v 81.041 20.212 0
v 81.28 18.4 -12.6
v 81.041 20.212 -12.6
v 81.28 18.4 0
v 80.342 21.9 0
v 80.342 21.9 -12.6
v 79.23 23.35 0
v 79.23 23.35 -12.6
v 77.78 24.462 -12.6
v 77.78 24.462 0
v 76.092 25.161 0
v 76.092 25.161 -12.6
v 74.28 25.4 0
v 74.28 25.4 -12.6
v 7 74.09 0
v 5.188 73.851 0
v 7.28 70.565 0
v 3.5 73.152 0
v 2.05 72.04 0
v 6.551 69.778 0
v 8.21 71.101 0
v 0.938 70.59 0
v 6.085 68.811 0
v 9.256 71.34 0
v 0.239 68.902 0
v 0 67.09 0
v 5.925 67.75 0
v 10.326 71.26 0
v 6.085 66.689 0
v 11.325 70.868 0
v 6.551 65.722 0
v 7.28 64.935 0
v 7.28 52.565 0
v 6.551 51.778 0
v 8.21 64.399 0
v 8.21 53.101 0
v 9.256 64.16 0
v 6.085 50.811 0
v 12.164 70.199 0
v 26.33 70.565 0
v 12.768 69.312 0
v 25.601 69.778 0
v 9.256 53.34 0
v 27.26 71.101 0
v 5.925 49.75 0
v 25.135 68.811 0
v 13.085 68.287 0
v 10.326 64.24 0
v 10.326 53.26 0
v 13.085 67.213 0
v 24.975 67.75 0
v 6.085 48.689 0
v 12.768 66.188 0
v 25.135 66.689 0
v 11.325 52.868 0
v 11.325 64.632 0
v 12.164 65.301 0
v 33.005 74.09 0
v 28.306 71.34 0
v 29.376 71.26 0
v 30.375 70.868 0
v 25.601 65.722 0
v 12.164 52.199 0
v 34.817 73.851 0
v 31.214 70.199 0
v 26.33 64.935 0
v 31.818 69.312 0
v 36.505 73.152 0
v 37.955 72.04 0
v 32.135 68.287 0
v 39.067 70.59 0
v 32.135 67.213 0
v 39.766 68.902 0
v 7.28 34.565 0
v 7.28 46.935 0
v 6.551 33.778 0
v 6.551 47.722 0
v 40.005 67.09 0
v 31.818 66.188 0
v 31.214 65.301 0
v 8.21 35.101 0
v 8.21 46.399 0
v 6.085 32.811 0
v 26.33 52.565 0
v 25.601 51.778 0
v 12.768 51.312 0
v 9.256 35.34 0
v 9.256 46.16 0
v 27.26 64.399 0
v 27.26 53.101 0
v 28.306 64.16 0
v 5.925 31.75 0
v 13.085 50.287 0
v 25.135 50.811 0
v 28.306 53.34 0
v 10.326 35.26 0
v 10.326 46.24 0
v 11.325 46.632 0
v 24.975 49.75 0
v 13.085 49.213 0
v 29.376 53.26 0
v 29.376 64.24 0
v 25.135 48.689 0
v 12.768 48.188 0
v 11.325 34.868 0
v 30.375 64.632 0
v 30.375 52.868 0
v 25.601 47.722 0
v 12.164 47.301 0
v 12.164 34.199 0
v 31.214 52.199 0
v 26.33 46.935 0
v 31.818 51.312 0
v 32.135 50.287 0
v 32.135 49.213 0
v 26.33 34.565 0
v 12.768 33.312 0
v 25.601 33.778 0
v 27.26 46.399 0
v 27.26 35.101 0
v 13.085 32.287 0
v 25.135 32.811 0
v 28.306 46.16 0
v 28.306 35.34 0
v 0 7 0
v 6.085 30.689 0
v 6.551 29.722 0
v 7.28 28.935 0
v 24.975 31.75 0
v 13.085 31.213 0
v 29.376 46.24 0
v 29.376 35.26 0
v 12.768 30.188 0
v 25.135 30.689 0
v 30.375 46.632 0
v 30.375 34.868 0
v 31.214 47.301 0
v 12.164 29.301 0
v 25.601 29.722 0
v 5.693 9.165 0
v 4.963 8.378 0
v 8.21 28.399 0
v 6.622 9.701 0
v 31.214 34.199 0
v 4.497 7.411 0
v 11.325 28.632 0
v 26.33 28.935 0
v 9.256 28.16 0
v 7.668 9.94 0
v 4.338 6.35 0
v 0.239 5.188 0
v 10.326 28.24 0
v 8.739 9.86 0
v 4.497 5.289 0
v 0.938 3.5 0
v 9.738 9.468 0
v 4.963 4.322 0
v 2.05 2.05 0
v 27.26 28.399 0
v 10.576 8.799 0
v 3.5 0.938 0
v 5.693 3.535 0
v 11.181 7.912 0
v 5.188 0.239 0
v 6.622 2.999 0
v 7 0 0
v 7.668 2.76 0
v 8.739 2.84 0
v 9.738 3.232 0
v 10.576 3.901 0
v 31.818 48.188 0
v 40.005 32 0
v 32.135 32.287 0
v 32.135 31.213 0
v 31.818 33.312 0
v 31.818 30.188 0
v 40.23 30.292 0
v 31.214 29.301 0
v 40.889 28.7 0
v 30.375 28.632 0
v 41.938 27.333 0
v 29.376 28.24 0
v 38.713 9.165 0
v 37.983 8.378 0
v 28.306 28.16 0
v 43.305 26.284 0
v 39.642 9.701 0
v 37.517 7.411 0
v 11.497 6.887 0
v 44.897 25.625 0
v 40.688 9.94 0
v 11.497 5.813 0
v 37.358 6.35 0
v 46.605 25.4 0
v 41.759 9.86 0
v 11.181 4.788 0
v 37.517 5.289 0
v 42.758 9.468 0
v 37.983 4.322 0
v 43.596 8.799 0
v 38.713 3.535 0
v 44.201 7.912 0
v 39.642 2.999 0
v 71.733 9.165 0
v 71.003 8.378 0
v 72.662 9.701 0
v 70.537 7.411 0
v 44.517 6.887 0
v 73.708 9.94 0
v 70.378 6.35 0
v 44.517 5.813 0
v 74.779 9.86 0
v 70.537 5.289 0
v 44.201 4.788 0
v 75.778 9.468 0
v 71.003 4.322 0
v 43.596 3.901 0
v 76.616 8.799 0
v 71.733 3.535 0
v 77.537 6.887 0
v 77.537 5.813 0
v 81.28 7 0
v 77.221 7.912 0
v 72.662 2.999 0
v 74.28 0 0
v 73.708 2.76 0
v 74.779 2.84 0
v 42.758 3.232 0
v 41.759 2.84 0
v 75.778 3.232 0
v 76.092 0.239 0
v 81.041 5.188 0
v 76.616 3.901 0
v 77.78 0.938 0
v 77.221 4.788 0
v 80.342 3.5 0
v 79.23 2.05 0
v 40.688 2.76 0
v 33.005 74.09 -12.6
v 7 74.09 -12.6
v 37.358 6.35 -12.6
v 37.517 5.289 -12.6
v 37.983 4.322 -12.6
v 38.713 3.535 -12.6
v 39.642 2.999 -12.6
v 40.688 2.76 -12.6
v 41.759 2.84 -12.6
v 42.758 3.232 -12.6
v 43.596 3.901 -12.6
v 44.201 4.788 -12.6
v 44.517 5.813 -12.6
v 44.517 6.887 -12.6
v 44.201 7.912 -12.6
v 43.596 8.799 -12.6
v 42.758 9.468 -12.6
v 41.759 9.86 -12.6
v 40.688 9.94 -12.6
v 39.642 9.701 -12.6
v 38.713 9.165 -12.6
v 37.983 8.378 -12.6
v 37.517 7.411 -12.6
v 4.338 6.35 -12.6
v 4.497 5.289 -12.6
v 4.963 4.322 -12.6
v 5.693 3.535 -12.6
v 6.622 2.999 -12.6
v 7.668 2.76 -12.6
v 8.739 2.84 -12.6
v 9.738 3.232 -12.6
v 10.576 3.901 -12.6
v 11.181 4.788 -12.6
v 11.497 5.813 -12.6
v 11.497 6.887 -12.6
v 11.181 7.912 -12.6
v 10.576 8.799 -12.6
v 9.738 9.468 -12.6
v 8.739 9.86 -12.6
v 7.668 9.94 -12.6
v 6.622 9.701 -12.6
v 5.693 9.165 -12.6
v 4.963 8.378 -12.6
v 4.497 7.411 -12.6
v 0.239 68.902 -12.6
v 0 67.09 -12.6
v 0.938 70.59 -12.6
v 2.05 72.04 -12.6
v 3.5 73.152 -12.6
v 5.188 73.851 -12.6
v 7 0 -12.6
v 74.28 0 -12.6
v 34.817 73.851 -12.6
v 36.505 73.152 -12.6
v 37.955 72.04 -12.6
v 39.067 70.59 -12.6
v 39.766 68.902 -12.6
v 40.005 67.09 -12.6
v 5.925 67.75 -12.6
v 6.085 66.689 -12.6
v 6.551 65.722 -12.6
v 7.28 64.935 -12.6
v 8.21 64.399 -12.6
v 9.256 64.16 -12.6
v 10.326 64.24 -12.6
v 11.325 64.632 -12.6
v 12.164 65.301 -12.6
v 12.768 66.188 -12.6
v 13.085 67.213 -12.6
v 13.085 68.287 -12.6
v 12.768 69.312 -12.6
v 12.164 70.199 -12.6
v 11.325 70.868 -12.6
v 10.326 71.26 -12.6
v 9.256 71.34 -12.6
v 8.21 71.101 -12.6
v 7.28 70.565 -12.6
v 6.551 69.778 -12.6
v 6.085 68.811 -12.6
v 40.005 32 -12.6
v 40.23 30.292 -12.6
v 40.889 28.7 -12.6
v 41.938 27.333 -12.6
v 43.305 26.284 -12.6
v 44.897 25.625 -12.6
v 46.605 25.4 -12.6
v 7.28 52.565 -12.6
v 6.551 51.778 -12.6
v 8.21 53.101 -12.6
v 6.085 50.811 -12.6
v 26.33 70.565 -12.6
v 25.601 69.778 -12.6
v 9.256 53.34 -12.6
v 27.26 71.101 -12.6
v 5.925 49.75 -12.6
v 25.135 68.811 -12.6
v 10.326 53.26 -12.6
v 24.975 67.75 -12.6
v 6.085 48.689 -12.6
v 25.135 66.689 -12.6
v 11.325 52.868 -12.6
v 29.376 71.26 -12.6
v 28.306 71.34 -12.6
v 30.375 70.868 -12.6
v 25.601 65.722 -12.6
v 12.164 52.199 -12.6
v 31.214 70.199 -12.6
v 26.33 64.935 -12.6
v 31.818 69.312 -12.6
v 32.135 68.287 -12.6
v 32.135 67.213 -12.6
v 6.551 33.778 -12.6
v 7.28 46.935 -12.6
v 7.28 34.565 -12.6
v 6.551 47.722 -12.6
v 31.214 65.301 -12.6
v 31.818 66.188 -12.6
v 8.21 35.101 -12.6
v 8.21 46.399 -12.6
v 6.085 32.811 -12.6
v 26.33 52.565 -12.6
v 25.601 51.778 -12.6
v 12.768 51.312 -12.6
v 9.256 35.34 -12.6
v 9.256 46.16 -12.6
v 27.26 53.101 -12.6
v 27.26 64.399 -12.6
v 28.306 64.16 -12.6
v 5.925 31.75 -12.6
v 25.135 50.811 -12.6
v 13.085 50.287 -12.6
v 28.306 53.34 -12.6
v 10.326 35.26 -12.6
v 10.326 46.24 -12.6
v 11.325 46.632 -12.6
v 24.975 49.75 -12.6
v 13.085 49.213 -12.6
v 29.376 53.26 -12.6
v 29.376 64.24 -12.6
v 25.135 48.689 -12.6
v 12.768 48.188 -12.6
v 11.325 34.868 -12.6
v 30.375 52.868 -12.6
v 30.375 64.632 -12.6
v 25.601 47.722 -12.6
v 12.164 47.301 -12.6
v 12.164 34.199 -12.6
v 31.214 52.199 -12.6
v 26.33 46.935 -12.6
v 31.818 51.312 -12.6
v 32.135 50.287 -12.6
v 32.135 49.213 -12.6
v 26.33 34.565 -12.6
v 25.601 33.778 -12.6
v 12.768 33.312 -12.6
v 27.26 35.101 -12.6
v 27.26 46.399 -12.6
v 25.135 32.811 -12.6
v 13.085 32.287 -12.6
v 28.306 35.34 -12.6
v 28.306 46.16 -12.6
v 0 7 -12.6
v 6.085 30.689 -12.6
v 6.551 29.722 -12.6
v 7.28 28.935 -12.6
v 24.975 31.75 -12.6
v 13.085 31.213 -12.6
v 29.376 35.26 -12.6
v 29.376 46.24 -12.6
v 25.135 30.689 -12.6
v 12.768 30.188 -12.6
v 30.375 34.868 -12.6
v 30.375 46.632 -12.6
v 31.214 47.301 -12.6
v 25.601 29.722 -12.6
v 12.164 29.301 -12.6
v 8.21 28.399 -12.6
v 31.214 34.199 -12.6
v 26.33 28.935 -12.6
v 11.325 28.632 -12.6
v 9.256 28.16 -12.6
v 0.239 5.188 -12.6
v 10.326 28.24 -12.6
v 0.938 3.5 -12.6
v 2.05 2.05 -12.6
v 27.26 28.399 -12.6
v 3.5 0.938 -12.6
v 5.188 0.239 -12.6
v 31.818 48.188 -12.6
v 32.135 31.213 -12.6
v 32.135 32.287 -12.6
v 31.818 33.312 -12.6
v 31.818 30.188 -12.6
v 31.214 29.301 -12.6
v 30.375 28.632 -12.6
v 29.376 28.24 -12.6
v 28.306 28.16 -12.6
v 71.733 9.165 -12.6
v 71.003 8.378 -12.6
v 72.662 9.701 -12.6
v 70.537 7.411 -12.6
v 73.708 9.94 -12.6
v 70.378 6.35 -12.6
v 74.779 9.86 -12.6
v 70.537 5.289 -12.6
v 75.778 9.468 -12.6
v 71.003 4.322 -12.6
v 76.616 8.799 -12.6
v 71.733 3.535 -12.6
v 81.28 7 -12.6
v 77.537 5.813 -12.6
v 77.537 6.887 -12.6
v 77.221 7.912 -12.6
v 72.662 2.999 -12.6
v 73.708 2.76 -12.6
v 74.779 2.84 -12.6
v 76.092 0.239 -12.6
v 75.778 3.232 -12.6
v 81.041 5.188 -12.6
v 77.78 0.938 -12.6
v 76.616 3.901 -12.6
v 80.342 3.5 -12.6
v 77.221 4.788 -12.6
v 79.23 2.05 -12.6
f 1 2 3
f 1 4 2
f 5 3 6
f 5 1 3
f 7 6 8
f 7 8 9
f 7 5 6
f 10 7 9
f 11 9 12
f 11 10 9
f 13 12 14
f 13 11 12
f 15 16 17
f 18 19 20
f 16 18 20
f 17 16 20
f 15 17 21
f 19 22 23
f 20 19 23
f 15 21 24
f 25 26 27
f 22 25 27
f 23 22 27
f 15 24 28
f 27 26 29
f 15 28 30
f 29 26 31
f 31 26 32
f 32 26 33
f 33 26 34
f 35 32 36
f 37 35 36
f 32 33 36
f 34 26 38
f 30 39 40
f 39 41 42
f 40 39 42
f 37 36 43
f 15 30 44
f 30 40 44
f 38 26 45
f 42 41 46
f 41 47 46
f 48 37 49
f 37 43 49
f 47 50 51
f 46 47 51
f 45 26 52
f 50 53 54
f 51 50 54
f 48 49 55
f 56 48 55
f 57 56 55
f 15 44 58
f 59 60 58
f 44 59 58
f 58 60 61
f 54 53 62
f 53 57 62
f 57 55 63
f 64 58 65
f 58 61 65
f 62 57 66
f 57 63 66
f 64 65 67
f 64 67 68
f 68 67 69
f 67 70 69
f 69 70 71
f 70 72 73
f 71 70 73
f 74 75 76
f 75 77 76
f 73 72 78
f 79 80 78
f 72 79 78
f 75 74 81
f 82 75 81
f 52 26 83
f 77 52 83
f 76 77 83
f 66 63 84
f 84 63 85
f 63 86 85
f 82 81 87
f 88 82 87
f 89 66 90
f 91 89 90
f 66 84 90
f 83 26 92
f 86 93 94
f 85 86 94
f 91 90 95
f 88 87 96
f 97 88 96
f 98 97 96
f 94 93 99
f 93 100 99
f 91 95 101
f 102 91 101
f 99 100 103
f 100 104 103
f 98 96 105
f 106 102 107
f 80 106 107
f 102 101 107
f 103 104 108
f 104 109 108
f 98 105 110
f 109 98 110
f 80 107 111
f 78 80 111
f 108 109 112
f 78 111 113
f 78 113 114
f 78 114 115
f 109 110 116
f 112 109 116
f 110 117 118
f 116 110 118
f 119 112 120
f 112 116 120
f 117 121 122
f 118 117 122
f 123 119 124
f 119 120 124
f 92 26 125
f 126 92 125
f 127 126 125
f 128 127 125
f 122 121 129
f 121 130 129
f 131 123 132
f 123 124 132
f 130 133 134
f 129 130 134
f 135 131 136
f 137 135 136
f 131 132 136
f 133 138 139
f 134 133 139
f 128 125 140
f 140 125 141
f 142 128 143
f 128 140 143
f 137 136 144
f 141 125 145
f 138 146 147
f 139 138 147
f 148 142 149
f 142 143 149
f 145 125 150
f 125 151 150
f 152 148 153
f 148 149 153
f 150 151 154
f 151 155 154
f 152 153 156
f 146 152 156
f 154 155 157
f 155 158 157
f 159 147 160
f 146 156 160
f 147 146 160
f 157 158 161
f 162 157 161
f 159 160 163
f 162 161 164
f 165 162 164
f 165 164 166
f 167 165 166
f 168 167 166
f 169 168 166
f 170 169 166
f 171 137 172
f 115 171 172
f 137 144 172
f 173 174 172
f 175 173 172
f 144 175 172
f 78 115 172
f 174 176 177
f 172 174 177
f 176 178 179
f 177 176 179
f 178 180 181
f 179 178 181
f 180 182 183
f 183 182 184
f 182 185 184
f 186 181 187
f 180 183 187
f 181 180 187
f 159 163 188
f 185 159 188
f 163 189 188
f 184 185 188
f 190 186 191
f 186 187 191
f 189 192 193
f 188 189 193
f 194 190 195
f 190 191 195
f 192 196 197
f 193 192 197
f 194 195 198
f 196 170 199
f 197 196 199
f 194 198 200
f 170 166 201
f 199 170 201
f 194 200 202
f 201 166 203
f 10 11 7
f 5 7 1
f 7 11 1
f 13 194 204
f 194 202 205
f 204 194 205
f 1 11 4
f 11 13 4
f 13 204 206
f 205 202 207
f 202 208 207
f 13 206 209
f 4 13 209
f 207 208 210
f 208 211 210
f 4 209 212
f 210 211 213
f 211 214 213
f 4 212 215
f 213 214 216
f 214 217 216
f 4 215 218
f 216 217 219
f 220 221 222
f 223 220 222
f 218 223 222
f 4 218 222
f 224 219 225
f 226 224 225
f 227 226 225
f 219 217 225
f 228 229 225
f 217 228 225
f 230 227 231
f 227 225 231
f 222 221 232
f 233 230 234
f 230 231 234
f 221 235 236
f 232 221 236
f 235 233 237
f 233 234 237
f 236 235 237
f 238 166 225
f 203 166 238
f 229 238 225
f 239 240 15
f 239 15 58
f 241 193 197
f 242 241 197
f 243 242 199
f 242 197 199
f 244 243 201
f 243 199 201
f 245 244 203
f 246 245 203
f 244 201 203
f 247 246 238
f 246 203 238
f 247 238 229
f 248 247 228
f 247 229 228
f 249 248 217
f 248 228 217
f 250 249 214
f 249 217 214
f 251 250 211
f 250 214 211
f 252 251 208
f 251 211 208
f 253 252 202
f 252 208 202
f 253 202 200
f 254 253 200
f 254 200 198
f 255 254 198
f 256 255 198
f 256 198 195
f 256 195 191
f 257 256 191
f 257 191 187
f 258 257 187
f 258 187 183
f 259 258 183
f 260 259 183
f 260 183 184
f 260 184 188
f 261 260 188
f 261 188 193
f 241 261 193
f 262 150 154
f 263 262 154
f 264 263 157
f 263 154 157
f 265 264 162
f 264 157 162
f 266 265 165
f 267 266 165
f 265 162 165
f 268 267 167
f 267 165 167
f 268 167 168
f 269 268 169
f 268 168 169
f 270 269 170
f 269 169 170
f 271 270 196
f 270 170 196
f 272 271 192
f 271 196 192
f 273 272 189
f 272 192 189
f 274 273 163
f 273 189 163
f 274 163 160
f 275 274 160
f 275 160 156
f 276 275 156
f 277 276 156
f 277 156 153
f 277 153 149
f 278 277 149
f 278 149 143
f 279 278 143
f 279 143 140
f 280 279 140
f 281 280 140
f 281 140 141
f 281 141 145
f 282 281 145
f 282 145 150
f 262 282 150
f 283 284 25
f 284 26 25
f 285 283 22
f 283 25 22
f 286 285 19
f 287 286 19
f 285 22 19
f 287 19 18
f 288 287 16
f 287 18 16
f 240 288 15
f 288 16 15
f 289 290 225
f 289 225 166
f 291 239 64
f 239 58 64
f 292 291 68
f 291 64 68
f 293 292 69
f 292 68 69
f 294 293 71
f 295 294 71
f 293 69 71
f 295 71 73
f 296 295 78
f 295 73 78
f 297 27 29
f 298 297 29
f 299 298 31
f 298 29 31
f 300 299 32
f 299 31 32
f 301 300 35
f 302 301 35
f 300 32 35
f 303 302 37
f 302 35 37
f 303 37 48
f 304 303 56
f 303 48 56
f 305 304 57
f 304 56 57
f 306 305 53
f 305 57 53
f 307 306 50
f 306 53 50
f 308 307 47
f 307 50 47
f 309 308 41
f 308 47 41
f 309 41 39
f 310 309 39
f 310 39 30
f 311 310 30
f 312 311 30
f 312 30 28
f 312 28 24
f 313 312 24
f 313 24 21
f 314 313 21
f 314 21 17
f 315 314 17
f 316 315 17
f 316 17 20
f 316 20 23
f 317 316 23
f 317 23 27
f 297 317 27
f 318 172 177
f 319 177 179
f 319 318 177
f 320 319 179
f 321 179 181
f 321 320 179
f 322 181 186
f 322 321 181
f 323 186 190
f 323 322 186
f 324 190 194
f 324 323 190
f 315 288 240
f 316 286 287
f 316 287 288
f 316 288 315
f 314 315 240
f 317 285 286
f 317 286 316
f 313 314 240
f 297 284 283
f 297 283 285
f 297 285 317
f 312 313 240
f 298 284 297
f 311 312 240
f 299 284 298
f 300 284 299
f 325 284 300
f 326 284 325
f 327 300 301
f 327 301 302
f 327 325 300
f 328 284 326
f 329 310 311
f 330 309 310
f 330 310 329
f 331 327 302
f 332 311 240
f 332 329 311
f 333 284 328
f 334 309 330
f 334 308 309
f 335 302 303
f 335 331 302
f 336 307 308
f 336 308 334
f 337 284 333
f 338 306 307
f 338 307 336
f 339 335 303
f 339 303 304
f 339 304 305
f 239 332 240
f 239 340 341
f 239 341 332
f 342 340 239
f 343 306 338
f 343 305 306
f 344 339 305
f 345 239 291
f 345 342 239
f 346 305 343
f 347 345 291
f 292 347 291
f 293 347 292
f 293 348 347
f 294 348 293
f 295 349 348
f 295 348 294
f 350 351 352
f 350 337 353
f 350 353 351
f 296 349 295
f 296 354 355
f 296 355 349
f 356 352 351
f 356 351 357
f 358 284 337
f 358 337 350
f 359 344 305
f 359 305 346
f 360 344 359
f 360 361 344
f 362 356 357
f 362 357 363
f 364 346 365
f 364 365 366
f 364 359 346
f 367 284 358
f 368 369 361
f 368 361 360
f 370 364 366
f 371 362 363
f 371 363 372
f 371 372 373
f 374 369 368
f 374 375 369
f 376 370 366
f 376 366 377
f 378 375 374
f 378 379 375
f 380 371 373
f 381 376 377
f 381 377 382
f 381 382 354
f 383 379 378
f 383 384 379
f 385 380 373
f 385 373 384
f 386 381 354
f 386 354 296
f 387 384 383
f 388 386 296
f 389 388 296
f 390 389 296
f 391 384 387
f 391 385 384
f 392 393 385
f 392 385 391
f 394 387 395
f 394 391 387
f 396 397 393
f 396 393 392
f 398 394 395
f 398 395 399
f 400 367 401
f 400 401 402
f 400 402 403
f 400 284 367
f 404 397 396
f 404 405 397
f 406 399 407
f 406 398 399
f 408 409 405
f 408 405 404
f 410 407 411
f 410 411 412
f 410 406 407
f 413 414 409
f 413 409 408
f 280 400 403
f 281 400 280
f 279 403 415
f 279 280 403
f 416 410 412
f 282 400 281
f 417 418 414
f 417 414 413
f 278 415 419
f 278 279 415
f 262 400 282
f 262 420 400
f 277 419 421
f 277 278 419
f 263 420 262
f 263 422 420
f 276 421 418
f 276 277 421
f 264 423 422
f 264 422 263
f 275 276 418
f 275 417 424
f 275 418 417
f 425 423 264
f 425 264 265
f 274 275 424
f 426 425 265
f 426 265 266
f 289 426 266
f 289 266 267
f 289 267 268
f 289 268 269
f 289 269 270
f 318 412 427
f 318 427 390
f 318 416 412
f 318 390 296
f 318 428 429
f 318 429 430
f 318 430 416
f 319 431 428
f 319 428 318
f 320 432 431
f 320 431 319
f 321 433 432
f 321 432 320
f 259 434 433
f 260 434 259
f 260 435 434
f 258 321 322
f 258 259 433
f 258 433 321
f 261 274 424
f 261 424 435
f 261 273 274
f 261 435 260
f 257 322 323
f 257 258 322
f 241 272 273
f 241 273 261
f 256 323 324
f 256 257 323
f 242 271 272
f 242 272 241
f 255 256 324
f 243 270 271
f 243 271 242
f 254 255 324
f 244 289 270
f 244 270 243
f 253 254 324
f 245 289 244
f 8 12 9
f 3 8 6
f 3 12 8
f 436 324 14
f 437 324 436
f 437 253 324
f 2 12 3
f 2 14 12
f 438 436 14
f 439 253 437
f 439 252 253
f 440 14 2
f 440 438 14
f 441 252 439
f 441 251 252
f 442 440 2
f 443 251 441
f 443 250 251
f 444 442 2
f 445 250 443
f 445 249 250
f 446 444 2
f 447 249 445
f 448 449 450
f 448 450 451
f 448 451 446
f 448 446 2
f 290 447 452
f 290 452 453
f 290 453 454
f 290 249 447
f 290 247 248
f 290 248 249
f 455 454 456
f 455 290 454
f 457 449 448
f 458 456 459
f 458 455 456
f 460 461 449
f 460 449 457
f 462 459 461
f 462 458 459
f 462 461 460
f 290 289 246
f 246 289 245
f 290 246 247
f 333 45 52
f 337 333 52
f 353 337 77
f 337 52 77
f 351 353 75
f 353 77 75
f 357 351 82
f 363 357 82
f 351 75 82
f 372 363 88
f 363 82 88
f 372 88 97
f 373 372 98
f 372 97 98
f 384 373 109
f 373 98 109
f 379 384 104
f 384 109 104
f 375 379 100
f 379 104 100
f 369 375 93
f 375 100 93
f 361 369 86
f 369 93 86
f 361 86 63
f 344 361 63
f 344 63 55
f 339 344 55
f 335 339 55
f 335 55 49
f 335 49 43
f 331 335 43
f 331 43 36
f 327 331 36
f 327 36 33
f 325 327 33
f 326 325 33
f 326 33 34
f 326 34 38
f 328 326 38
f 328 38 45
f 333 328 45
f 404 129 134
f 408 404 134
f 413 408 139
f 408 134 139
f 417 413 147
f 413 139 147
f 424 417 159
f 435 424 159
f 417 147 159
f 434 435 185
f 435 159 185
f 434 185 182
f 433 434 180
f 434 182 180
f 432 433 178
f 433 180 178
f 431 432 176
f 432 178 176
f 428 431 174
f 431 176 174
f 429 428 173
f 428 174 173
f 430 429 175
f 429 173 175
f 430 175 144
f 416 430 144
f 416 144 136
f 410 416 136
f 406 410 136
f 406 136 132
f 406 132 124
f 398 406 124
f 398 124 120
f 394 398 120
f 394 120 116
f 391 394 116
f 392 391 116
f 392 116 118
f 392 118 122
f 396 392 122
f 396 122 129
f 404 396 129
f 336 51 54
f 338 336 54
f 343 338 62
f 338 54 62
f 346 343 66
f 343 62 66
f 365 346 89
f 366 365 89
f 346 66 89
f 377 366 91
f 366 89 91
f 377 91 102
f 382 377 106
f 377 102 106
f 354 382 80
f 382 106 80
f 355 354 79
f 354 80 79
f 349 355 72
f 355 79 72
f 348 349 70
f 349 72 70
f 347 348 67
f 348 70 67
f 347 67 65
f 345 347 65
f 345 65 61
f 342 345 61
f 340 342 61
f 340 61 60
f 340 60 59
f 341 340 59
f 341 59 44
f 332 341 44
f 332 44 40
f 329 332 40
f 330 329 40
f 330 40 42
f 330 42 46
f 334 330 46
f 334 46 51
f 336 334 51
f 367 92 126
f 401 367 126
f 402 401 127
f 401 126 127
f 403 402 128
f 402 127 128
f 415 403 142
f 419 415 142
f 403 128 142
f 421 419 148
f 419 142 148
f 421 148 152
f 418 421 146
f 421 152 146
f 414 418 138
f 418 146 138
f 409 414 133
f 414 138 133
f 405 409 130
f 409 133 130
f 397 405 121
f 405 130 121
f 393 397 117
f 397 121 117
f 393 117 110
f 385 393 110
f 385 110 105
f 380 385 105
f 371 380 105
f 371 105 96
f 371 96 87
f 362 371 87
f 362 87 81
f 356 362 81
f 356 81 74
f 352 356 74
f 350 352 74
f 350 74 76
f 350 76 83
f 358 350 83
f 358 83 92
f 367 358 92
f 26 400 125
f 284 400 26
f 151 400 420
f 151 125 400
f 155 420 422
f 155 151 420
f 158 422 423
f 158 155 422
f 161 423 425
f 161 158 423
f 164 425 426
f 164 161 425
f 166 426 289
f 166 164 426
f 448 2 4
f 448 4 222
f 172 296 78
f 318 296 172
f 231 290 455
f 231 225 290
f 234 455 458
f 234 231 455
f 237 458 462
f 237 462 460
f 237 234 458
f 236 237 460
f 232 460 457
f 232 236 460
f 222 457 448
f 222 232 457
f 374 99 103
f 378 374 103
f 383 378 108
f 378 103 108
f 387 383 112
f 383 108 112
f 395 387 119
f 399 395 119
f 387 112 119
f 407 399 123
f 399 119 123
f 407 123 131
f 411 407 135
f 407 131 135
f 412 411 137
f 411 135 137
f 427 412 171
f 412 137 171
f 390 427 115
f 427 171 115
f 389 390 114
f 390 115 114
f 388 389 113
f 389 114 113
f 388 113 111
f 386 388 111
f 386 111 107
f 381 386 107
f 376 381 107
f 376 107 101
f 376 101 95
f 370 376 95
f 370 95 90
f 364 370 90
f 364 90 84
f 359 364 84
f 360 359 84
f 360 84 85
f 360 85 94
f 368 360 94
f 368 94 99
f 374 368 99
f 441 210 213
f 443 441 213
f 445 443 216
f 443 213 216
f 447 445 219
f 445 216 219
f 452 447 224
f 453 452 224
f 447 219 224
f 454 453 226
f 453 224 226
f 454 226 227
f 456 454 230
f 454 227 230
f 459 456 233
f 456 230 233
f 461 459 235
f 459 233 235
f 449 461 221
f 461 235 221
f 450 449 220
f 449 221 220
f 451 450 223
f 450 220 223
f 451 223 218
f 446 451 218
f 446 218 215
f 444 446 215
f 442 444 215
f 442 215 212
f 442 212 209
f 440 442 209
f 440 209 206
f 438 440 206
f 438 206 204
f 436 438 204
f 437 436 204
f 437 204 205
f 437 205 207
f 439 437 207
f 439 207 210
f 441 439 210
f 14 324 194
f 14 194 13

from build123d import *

# Parameters (mm, degrees)
PAD_DEPTH             = 12.6
SKETCH001_R           = 3.6
POCKET_DEPTH          = 12.601
FILLET_R              = 7
CLONE_PLACEMENT_ANGLE = 180


with BuildPart() as part:
    # Sketch → Pad (new body)
    with BuildSketch(Plane.XY):
        with BuildLine():
            Line((0, 0), (0, -74.09))
            Line((0, -74.09), (-40.005, -74.09))
            Line((-40.005, -74.09), (-40.005, -32))
            ThreePointArc((-40.005, -32), (-41.938095, -27.333095), (-46.605, -25.4))
            Line((-46.605, -25.4), (-81.28, -25.4))
            Line((-81.28, -25.4), (-81.28, 0))
            Line((-81.28, 0), (0, 0))
        make_face()
    extrude(amount=PAD_DEPTH)

    # Sketch001 (on Face9 of Pad) → Pocket (cut, through all)
    with BuildSketch(Plane.XY.offset(12.6)):
        with Locations((-73.9775, -6.35)):
            Circle(SKETCH001_R)
        with Locations((-7.9375, -6.35)):
            Circle(SKETCH001_R)
        with Locations((-40.9575, -6.35)):
            Circle(SKETCH001_R)
        with Locations((-28.575, -31.75)):
            Circle(SKETCH001_R)
        with Locations((-9.525, -31.75)):
            Circle(SKETCH001_R)
        with Locations((-28.575, -49.75)):
            Circle(SKETCH001_R)
        with Locations((-9.525, -49.75)):
            Circle(SKETCH001_R)
        with Locations((-28.575, -67.75)):
            Circle(SKETCH001_R)
        with Locations((-9.525, -67.75)):
            Circle(SKETCH001_R)
    extrude(amount=-POCKET_DEPTH, mode=Mode.SUBTRACT)

    # Fillet
    fillet_edges = [part.edges().sort_by_distance(p)[0] for p in [
        (0, 0, 6.3),
        (-81.28, 0, 6.3),
        (-81.28, -25.4, 6.3),
        (-40.005, -74.09, 6.3),
        (0, -74.09, 6.3),
    ]]
    fillet(fillet_edges, radius=FILLET_R)


with BuildPart() as part_1:
    # Clone placement: moved
    add(part.part.moved(Location((0, 0, -12.6))).rotate(Axis((0, 0, -12.6), (0, 0, 1)), CLONE_PLACEMENT_ANGLE))


solid = part_1.part
